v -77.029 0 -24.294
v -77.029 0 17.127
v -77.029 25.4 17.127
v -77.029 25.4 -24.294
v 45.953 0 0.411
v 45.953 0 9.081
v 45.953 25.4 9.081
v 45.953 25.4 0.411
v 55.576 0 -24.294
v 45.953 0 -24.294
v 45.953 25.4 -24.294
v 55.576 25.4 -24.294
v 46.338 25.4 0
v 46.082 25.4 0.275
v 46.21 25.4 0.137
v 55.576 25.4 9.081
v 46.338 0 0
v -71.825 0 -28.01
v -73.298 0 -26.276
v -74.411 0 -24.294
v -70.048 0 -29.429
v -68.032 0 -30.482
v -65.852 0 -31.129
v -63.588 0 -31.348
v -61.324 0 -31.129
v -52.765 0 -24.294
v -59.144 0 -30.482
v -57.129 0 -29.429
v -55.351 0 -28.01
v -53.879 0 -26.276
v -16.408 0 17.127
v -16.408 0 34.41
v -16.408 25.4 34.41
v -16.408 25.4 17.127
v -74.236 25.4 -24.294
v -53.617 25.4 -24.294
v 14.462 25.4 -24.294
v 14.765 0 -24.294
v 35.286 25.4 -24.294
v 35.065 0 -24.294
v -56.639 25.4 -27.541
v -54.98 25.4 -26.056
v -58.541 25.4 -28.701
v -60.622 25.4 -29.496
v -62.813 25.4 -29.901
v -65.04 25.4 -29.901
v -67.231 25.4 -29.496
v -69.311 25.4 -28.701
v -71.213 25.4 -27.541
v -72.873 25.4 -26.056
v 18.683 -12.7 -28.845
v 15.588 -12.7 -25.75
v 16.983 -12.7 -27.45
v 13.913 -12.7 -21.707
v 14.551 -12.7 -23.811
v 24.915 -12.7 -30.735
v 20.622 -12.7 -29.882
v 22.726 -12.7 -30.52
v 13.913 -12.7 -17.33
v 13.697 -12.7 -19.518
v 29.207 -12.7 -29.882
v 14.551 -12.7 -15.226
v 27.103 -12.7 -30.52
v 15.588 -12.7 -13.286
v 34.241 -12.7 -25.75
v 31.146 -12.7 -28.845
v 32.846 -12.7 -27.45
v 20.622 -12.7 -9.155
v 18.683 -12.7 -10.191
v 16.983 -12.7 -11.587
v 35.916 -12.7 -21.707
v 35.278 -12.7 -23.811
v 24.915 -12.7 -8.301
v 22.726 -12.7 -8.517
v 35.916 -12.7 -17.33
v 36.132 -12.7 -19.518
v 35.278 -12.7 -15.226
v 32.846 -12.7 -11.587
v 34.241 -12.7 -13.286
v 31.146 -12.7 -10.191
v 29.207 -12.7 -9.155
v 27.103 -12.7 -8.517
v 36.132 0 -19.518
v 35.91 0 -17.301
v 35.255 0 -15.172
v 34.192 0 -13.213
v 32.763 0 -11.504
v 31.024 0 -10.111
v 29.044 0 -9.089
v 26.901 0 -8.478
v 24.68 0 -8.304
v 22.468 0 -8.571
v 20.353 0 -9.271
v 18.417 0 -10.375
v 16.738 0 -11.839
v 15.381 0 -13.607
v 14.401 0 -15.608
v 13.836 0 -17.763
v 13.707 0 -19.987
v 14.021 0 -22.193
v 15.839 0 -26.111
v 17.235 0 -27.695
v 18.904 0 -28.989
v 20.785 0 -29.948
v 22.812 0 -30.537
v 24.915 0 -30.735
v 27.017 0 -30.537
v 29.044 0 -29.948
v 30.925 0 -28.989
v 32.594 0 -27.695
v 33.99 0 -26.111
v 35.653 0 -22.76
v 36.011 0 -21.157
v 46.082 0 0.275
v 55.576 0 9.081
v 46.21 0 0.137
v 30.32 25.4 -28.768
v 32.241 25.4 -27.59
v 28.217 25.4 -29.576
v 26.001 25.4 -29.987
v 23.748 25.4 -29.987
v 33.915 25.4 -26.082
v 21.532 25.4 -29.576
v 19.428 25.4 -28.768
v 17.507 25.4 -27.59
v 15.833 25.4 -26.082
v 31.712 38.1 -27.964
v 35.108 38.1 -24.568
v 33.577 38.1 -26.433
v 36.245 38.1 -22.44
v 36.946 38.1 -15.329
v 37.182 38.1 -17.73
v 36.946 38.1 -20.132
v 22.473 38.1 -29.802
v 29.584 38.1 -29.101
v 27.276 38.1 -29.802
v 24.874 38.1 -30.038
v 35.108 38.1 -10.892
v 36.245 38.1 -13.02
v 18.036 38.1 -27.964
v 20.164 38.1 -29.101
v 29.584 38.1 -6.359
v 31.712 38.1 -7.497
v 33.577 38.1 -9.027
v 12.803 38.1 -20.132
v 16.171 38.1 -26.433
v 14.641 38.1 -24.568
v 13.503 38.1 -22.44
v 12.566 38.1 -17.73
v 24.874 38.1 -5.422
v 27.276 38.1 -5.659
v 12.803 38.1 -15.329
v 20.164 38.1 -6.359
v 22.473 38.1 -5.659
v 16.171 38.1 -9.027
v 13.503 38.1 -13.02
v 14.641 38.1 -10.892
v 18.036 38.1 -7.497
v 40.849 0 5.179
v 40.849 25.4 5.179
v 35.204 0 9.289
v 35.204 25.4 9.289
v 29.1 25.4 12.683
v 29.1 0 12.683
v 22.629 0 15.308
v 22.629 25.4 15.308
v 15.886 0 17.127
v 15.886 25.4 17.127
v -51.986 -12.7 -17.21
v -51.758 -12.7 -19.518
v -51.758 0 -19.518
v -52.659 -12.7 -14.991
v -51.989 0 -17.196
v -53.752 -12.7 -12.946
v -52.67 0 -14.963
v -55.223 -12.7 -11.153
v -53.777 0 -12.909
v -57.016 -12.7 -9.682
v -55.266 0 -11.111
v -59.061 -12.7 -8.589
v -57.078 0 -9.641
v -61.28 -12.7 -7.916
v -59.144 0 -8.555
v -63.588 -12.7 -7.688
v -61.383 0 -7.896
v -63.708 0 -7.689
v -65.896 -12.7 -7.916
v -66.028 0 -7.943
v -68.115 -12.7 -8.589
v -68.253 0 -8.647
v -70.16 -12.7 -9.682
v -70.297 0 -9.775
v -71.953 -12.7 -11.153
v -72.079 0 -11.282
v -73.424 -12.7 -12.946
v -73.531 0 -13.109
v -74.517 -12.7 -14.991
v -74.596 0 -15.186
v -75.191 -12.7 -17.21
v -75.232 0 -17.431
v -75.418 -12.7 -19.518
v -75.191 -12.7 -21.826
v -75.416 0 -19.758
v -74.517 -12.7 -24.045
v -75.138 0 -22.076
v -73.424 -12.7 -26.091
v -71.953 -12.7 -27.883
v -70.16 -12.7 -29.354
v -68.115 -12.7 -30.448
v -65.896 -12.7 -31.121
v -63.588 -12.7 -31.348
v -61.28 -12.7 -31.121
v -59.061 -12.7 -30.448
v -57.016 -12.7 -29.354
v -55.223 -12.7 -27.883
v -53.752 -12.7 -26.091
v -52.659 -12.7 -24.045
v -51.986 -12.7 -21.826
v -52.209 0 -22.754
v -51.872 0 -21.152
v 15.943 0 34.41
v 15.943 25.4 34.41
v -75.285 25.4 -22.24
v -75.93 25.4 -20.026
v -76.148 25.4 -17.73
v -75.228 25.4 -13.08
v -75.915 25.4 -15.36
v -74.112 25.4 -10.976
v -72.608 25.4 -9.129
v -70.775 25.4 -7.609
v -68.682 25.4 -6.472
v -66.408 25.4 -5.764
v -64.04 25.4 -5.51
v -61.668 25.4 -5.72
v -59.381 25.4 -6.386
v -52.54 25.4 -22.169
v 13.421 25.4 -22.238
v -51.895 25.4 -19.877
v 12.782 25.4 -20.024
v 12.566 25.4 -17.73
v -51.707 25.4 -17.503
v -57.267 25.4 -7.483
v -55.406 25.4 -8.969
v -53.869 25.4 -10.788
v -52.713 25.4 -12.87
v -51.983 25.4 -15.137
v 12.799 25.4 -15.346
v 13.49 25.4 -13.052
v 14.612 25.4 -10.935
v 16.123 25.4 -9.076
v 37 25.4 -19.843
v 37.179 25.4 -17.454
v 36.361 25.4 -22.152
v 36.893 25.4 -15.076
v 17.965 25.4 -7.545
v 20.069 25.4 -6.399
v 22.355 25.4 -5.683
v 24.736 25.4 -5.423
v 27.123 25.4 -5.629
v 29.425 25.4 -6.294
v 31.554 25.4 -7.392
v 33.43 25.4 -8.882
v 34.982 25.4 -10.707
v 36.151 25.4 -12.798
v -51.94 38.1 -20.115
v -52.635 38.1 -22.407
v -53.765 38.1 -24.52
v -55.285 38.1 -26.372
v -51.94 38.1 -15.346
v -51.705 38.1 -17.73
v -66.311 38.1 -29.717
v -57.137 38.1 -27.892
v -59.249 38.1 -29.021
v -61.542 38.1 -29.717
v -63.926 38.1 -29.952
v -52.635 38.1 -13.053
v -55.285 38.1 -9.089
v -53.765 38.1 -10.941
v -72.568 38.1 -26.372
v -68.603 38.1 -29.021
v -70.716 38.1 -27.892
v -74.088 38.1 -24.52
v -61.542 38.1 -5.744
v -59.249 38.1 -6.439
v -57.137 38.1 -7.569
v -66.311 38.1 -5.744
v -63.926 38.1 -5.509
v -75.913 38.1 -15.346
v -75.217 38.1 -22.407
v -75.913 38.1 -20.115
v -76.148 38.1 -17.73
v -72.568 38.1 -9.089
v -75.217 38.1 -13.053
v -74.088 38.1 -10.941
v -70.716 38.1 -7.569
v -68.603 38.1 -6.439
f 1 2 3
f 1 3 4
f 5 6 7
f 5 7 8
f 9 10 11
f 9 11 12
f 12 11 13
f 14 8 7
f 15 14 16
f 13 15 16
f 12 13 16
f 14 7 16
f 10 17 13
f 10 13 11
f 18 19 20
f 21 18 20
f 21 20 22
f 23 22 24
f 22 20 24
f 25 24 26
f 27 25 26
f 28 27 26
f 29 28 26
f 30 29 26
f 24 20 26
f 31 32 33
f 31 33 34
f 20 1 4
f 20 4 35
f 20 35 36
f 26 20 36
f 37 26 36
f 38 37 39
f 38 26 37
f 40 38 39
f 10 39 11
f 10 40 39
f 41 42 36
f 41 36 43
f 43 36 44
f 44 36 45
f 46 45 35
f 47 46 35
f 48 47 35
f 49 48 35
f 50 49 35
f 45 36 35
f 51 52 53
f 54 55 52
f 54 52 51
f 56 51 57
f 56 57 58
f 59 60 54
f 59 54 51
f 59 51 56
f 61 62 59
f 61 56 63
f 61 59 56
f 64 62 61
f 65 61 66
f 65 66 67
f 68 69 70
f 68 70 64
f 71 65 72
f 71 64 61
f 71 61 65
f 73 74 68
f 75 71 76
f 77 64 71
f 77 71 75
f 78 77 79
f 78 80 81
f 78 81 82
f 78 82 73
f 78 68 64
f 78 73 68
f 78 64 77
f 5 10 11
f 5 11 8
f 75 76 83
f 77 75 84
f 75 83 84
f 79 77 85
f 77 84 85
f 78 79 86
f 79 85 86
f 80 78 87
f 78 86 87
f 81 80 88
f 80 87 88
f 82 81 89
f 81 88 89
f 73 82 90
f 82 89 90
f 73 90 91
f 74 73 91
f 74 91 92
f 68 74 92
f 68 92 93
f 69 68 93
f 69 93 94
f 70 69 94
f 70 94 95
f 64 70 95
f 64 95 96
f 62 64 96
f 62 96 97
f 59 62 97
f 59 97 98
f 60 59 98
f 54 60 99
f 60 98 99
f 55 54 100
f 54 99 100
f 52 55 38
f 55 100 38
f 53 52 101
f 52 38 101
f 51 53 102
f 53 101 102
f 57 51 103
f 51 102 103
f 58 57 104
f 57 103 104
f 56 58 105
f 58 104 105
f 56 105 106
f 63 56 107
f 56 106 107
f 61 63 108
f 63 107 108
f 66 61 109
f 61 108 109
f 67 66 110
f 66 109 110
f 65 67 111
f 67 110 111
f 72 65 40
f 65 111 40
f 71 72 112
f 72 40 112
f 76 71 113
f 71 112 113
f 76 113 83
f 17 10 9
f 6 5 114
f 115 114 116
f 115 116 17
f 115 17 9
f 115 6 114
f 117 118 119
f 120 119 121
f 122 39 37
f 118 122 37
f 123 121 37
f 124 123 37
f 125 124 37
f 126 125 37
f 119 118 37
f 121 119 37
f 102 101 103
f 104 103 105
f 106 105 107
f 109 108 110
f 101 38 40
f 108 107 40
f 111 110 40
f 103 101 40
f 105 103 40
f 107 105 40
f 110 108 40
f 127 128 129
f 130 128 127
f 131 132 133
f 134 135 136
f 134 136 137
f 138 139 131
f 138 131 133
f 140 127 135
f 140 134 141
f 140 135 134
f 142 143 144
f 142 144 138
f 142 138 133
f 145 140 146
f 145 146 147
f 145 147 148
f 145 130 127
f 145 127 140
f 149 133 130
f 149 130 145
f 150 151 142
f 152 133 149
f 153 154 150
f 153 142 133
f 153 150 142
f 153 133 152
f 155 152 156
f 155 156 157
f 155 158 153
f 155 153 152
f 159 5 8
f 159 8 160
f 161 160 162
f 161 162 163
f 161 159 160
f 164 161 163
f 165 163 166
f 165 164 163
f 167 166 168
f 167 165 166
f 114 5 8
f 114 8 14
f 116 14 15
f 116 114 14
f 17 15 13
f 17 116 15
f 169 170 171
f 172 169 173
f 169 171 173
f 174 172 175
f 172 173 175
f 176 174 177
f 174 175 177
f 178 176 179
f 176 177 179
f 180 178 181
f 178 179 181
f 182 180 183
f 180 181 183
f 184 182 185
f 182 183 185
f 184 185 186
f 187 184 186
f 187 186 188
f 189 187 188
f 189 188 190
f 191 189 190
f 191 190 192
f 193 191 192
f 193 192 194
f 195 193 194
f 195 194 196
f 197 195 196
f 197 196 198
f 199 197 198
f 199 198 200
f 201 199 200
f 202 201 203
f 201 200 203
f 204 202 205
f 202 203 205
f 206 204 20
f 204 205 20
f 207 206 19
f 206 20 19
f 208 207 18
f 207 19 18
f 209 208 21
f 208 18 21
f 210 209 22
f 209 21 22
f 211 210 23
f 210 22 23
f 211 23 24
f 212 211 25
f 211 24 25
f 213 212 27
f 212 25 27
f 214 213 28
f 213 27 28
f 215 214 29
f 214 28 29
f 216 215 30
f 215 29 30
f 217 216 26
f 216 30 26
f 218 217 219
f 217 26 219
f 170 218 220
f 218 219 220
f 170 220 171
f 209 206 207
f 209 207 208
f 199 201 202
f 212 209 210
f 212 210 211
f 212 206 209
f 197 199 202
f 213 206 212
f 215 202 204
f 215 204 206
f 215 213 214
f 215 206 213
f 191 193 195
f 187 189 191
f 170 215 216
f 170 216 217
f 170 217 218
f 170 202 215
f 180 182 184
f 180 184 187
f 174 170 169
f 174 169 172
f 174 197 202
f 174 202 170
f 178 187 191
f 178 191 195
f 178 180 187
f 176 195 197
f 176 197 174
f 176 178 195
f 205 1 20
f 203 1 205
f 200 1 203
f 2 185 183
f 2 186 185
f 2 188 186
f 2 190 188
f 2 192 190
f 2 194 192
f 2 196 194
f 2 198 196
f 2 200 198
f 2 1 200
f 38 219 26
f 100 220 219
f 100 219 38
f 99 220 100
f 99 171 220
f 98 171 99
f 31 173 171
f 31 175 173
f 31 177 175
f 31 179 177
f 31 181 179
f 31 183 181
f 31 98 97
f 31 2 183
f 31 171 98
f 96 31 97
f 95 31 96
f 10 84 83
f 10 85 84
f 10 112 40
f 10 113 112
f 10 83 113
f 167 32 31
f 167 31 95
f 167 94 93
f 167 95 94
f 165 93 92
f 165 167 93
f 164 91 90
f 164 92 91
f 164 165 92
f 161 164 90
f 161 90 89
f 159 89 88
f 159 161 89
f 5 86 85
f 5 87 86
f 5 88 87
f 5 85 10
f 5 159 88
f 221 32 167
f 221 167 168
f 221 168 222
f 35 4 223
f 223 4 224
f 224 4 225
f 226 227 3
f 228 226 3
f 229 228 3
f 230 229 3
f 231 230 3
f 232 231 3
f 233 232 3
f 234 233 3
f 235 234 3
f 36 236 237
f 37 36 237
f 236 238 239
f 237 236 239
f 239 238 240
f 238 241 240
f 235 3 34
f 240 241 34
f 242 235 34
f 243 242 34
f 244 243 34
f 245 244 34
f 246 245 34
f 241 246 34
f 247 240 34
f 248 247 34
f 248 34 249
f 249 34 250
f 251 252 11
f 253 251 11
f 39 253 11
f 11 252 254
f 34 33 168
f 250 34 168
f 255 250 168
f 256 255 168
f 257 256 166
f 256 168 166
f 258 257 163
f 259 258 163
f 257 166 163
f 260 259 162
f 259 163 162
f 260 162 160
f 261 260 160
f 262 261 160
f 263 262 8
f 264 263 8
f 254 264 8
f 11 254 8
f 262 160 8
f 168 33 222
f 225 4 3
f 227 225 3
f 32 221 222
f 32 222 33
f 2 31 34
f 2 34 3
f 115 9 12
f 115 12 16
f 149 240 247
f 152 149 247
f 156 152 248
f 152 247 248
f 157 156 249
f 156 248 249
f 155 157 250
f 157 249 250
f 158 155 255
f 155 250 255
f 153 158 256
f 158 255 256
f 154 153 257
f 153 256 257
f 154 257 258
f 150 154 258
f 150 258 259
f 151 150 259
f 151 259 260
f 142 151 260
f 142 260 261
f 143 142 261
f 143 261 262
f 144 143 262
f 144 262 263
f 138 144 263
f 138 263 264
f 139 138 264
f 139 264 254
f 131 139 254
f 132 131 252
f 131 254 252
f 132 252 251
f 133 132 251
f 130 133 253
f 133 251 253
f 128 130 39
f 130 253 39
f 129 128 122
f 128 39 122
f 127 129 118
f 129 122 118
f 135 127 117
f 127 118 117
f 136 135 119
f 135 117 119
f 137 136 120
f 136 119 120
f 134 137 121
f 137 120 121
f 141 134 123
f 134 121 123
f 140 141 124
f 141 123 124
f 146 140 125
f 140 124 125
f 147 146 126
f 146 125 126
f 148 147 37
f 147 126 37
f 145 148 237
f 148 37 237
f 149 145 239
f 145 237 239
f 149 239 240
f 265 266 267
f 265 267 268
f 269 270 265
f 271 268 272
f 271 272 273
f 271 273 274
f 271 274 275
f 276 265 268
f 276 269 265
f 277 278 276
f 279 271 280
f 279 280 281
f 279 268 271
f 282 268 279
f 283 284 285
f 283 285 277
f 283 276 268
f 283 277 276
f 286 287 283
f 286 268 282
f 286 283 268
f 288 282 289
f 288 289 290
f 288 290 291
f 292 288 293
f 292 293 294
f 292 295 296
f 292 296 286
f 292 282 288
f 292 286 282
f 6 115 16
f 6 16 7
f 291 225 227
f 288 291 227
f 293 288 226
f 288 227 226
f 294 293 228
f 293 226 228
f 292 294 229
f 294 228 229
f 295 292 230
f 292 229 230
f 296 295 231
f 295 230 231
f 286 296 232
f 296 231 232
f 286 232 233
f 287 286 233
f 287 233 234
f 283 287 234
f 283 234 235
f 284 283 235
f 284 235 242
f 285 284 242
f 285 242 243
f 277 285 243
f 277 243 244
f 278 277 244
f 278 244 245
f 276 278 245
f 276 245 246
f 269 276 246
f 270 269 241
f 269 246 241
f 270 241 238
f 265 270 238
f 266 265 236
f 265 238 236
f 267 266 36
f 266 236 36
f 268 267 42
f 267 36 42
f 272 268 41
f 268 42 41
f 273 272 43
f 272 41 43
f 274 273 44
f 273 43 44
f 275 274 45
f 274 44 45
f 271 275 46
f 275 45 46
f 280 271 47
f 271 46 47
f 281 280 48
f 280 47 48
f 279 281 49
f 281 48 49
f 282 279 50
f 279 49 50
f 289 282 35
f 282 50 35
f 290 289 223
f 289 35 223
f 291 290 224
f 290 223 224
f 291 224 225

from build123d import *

# Parameters (mm, degrees)
F0_R     = 15.308346
F1_DEPTH = 25.4
F2_R     = 11.829815
F2_R_2   = 11.217212
F3_DEPTH = 12.7
F4_R     = 12.308057
F4_R_2   = 12.221176
F5_DEPTH = 12.7


with BuildPart() as f1:
    # F0 (on Front) → F1 (new body)
    with BuildSketch(Plane.XZ):
        with BuildLine():
            Line((-16.408481, 34.410242), (-16.408481, 17.12689))
            ThreePointArc((-16.408481, 17.12689), (-0.261047, -9.847064), (15.886386, 17.12689))
            Line((15.886386, 17.12689), (15.943475, 34.410242))
            Line((15.943475, 34.410242), (-16.408481, 34.410242))
        make_face()
        with Locations((-0.261047, 8.473086)):
            Circle(F0_R, mode=Mode.SUBTRACT)
        with BuildLine():
            Line((-16.408481, 17.12689), (-77.029042, 17.12689))
            Line((-77.029042, 17.12689), (-77.029042, -24.293557))
            Line((-77.029042, -24.293557), (45.952621, -24.293557))
            Line((45.952621, -24.293557), (45.952621, 0.411144))
            ThreePointArc((45.952621, 0.411144), (32.203921, 11.079271), (15.886386, 17.12689))
            ThreePointArc((15.886386, 17.12689), (-0.261047, -9.847064), (-16.408481, 17.12689))
        make_face()
        with BuildLine():
            Line((46.338335, 0), (45.952621, -24.293557))
            Line((45.952621, -24.293557), (55.575985, -24.293557))
            Line((55.575985, -24.293557), (55.575985, 9.081191))
            Line((55.575985, 9.081191), (45.952621, 9.081191))
            Line((45.952621, 9.081191), (45.952621, 0.411144))
            ThreePointArc((45.952621, 0.411144), (46.145983, 0.206047), (46.338335, 0))
        make_face()
        with Locations((-0.261047, 8.473086)):
            Circle(F0_R)
    extrude(amount=-F1_DEPTH)

    # F2 (on Front) → F3 (join)
    with BuildSketch(Plane.XZ):
        with Locations((-63.58815, -19.518269)):
            Circle(F2_R)
        with Locations((24.914529, -19.518269)):
            Circle(F2_R_2)
    extrude(amount=F3_DEPTH)

    # F4 (on face) → F5 (join)
    with BuildSketch(Plane(origin=(0, 25.4, 0), x_dir=(-1, 0, 0), z_dir=(0, 1, 0))):
        with Locations((-24.874324, -17.730335)):
            Circle(F4_R)
        with Locations((63.926339, -17.730335)):
            Circle(F4_R_2)
    extrude(amount=F5_DEPTH)


solid = f1.part
